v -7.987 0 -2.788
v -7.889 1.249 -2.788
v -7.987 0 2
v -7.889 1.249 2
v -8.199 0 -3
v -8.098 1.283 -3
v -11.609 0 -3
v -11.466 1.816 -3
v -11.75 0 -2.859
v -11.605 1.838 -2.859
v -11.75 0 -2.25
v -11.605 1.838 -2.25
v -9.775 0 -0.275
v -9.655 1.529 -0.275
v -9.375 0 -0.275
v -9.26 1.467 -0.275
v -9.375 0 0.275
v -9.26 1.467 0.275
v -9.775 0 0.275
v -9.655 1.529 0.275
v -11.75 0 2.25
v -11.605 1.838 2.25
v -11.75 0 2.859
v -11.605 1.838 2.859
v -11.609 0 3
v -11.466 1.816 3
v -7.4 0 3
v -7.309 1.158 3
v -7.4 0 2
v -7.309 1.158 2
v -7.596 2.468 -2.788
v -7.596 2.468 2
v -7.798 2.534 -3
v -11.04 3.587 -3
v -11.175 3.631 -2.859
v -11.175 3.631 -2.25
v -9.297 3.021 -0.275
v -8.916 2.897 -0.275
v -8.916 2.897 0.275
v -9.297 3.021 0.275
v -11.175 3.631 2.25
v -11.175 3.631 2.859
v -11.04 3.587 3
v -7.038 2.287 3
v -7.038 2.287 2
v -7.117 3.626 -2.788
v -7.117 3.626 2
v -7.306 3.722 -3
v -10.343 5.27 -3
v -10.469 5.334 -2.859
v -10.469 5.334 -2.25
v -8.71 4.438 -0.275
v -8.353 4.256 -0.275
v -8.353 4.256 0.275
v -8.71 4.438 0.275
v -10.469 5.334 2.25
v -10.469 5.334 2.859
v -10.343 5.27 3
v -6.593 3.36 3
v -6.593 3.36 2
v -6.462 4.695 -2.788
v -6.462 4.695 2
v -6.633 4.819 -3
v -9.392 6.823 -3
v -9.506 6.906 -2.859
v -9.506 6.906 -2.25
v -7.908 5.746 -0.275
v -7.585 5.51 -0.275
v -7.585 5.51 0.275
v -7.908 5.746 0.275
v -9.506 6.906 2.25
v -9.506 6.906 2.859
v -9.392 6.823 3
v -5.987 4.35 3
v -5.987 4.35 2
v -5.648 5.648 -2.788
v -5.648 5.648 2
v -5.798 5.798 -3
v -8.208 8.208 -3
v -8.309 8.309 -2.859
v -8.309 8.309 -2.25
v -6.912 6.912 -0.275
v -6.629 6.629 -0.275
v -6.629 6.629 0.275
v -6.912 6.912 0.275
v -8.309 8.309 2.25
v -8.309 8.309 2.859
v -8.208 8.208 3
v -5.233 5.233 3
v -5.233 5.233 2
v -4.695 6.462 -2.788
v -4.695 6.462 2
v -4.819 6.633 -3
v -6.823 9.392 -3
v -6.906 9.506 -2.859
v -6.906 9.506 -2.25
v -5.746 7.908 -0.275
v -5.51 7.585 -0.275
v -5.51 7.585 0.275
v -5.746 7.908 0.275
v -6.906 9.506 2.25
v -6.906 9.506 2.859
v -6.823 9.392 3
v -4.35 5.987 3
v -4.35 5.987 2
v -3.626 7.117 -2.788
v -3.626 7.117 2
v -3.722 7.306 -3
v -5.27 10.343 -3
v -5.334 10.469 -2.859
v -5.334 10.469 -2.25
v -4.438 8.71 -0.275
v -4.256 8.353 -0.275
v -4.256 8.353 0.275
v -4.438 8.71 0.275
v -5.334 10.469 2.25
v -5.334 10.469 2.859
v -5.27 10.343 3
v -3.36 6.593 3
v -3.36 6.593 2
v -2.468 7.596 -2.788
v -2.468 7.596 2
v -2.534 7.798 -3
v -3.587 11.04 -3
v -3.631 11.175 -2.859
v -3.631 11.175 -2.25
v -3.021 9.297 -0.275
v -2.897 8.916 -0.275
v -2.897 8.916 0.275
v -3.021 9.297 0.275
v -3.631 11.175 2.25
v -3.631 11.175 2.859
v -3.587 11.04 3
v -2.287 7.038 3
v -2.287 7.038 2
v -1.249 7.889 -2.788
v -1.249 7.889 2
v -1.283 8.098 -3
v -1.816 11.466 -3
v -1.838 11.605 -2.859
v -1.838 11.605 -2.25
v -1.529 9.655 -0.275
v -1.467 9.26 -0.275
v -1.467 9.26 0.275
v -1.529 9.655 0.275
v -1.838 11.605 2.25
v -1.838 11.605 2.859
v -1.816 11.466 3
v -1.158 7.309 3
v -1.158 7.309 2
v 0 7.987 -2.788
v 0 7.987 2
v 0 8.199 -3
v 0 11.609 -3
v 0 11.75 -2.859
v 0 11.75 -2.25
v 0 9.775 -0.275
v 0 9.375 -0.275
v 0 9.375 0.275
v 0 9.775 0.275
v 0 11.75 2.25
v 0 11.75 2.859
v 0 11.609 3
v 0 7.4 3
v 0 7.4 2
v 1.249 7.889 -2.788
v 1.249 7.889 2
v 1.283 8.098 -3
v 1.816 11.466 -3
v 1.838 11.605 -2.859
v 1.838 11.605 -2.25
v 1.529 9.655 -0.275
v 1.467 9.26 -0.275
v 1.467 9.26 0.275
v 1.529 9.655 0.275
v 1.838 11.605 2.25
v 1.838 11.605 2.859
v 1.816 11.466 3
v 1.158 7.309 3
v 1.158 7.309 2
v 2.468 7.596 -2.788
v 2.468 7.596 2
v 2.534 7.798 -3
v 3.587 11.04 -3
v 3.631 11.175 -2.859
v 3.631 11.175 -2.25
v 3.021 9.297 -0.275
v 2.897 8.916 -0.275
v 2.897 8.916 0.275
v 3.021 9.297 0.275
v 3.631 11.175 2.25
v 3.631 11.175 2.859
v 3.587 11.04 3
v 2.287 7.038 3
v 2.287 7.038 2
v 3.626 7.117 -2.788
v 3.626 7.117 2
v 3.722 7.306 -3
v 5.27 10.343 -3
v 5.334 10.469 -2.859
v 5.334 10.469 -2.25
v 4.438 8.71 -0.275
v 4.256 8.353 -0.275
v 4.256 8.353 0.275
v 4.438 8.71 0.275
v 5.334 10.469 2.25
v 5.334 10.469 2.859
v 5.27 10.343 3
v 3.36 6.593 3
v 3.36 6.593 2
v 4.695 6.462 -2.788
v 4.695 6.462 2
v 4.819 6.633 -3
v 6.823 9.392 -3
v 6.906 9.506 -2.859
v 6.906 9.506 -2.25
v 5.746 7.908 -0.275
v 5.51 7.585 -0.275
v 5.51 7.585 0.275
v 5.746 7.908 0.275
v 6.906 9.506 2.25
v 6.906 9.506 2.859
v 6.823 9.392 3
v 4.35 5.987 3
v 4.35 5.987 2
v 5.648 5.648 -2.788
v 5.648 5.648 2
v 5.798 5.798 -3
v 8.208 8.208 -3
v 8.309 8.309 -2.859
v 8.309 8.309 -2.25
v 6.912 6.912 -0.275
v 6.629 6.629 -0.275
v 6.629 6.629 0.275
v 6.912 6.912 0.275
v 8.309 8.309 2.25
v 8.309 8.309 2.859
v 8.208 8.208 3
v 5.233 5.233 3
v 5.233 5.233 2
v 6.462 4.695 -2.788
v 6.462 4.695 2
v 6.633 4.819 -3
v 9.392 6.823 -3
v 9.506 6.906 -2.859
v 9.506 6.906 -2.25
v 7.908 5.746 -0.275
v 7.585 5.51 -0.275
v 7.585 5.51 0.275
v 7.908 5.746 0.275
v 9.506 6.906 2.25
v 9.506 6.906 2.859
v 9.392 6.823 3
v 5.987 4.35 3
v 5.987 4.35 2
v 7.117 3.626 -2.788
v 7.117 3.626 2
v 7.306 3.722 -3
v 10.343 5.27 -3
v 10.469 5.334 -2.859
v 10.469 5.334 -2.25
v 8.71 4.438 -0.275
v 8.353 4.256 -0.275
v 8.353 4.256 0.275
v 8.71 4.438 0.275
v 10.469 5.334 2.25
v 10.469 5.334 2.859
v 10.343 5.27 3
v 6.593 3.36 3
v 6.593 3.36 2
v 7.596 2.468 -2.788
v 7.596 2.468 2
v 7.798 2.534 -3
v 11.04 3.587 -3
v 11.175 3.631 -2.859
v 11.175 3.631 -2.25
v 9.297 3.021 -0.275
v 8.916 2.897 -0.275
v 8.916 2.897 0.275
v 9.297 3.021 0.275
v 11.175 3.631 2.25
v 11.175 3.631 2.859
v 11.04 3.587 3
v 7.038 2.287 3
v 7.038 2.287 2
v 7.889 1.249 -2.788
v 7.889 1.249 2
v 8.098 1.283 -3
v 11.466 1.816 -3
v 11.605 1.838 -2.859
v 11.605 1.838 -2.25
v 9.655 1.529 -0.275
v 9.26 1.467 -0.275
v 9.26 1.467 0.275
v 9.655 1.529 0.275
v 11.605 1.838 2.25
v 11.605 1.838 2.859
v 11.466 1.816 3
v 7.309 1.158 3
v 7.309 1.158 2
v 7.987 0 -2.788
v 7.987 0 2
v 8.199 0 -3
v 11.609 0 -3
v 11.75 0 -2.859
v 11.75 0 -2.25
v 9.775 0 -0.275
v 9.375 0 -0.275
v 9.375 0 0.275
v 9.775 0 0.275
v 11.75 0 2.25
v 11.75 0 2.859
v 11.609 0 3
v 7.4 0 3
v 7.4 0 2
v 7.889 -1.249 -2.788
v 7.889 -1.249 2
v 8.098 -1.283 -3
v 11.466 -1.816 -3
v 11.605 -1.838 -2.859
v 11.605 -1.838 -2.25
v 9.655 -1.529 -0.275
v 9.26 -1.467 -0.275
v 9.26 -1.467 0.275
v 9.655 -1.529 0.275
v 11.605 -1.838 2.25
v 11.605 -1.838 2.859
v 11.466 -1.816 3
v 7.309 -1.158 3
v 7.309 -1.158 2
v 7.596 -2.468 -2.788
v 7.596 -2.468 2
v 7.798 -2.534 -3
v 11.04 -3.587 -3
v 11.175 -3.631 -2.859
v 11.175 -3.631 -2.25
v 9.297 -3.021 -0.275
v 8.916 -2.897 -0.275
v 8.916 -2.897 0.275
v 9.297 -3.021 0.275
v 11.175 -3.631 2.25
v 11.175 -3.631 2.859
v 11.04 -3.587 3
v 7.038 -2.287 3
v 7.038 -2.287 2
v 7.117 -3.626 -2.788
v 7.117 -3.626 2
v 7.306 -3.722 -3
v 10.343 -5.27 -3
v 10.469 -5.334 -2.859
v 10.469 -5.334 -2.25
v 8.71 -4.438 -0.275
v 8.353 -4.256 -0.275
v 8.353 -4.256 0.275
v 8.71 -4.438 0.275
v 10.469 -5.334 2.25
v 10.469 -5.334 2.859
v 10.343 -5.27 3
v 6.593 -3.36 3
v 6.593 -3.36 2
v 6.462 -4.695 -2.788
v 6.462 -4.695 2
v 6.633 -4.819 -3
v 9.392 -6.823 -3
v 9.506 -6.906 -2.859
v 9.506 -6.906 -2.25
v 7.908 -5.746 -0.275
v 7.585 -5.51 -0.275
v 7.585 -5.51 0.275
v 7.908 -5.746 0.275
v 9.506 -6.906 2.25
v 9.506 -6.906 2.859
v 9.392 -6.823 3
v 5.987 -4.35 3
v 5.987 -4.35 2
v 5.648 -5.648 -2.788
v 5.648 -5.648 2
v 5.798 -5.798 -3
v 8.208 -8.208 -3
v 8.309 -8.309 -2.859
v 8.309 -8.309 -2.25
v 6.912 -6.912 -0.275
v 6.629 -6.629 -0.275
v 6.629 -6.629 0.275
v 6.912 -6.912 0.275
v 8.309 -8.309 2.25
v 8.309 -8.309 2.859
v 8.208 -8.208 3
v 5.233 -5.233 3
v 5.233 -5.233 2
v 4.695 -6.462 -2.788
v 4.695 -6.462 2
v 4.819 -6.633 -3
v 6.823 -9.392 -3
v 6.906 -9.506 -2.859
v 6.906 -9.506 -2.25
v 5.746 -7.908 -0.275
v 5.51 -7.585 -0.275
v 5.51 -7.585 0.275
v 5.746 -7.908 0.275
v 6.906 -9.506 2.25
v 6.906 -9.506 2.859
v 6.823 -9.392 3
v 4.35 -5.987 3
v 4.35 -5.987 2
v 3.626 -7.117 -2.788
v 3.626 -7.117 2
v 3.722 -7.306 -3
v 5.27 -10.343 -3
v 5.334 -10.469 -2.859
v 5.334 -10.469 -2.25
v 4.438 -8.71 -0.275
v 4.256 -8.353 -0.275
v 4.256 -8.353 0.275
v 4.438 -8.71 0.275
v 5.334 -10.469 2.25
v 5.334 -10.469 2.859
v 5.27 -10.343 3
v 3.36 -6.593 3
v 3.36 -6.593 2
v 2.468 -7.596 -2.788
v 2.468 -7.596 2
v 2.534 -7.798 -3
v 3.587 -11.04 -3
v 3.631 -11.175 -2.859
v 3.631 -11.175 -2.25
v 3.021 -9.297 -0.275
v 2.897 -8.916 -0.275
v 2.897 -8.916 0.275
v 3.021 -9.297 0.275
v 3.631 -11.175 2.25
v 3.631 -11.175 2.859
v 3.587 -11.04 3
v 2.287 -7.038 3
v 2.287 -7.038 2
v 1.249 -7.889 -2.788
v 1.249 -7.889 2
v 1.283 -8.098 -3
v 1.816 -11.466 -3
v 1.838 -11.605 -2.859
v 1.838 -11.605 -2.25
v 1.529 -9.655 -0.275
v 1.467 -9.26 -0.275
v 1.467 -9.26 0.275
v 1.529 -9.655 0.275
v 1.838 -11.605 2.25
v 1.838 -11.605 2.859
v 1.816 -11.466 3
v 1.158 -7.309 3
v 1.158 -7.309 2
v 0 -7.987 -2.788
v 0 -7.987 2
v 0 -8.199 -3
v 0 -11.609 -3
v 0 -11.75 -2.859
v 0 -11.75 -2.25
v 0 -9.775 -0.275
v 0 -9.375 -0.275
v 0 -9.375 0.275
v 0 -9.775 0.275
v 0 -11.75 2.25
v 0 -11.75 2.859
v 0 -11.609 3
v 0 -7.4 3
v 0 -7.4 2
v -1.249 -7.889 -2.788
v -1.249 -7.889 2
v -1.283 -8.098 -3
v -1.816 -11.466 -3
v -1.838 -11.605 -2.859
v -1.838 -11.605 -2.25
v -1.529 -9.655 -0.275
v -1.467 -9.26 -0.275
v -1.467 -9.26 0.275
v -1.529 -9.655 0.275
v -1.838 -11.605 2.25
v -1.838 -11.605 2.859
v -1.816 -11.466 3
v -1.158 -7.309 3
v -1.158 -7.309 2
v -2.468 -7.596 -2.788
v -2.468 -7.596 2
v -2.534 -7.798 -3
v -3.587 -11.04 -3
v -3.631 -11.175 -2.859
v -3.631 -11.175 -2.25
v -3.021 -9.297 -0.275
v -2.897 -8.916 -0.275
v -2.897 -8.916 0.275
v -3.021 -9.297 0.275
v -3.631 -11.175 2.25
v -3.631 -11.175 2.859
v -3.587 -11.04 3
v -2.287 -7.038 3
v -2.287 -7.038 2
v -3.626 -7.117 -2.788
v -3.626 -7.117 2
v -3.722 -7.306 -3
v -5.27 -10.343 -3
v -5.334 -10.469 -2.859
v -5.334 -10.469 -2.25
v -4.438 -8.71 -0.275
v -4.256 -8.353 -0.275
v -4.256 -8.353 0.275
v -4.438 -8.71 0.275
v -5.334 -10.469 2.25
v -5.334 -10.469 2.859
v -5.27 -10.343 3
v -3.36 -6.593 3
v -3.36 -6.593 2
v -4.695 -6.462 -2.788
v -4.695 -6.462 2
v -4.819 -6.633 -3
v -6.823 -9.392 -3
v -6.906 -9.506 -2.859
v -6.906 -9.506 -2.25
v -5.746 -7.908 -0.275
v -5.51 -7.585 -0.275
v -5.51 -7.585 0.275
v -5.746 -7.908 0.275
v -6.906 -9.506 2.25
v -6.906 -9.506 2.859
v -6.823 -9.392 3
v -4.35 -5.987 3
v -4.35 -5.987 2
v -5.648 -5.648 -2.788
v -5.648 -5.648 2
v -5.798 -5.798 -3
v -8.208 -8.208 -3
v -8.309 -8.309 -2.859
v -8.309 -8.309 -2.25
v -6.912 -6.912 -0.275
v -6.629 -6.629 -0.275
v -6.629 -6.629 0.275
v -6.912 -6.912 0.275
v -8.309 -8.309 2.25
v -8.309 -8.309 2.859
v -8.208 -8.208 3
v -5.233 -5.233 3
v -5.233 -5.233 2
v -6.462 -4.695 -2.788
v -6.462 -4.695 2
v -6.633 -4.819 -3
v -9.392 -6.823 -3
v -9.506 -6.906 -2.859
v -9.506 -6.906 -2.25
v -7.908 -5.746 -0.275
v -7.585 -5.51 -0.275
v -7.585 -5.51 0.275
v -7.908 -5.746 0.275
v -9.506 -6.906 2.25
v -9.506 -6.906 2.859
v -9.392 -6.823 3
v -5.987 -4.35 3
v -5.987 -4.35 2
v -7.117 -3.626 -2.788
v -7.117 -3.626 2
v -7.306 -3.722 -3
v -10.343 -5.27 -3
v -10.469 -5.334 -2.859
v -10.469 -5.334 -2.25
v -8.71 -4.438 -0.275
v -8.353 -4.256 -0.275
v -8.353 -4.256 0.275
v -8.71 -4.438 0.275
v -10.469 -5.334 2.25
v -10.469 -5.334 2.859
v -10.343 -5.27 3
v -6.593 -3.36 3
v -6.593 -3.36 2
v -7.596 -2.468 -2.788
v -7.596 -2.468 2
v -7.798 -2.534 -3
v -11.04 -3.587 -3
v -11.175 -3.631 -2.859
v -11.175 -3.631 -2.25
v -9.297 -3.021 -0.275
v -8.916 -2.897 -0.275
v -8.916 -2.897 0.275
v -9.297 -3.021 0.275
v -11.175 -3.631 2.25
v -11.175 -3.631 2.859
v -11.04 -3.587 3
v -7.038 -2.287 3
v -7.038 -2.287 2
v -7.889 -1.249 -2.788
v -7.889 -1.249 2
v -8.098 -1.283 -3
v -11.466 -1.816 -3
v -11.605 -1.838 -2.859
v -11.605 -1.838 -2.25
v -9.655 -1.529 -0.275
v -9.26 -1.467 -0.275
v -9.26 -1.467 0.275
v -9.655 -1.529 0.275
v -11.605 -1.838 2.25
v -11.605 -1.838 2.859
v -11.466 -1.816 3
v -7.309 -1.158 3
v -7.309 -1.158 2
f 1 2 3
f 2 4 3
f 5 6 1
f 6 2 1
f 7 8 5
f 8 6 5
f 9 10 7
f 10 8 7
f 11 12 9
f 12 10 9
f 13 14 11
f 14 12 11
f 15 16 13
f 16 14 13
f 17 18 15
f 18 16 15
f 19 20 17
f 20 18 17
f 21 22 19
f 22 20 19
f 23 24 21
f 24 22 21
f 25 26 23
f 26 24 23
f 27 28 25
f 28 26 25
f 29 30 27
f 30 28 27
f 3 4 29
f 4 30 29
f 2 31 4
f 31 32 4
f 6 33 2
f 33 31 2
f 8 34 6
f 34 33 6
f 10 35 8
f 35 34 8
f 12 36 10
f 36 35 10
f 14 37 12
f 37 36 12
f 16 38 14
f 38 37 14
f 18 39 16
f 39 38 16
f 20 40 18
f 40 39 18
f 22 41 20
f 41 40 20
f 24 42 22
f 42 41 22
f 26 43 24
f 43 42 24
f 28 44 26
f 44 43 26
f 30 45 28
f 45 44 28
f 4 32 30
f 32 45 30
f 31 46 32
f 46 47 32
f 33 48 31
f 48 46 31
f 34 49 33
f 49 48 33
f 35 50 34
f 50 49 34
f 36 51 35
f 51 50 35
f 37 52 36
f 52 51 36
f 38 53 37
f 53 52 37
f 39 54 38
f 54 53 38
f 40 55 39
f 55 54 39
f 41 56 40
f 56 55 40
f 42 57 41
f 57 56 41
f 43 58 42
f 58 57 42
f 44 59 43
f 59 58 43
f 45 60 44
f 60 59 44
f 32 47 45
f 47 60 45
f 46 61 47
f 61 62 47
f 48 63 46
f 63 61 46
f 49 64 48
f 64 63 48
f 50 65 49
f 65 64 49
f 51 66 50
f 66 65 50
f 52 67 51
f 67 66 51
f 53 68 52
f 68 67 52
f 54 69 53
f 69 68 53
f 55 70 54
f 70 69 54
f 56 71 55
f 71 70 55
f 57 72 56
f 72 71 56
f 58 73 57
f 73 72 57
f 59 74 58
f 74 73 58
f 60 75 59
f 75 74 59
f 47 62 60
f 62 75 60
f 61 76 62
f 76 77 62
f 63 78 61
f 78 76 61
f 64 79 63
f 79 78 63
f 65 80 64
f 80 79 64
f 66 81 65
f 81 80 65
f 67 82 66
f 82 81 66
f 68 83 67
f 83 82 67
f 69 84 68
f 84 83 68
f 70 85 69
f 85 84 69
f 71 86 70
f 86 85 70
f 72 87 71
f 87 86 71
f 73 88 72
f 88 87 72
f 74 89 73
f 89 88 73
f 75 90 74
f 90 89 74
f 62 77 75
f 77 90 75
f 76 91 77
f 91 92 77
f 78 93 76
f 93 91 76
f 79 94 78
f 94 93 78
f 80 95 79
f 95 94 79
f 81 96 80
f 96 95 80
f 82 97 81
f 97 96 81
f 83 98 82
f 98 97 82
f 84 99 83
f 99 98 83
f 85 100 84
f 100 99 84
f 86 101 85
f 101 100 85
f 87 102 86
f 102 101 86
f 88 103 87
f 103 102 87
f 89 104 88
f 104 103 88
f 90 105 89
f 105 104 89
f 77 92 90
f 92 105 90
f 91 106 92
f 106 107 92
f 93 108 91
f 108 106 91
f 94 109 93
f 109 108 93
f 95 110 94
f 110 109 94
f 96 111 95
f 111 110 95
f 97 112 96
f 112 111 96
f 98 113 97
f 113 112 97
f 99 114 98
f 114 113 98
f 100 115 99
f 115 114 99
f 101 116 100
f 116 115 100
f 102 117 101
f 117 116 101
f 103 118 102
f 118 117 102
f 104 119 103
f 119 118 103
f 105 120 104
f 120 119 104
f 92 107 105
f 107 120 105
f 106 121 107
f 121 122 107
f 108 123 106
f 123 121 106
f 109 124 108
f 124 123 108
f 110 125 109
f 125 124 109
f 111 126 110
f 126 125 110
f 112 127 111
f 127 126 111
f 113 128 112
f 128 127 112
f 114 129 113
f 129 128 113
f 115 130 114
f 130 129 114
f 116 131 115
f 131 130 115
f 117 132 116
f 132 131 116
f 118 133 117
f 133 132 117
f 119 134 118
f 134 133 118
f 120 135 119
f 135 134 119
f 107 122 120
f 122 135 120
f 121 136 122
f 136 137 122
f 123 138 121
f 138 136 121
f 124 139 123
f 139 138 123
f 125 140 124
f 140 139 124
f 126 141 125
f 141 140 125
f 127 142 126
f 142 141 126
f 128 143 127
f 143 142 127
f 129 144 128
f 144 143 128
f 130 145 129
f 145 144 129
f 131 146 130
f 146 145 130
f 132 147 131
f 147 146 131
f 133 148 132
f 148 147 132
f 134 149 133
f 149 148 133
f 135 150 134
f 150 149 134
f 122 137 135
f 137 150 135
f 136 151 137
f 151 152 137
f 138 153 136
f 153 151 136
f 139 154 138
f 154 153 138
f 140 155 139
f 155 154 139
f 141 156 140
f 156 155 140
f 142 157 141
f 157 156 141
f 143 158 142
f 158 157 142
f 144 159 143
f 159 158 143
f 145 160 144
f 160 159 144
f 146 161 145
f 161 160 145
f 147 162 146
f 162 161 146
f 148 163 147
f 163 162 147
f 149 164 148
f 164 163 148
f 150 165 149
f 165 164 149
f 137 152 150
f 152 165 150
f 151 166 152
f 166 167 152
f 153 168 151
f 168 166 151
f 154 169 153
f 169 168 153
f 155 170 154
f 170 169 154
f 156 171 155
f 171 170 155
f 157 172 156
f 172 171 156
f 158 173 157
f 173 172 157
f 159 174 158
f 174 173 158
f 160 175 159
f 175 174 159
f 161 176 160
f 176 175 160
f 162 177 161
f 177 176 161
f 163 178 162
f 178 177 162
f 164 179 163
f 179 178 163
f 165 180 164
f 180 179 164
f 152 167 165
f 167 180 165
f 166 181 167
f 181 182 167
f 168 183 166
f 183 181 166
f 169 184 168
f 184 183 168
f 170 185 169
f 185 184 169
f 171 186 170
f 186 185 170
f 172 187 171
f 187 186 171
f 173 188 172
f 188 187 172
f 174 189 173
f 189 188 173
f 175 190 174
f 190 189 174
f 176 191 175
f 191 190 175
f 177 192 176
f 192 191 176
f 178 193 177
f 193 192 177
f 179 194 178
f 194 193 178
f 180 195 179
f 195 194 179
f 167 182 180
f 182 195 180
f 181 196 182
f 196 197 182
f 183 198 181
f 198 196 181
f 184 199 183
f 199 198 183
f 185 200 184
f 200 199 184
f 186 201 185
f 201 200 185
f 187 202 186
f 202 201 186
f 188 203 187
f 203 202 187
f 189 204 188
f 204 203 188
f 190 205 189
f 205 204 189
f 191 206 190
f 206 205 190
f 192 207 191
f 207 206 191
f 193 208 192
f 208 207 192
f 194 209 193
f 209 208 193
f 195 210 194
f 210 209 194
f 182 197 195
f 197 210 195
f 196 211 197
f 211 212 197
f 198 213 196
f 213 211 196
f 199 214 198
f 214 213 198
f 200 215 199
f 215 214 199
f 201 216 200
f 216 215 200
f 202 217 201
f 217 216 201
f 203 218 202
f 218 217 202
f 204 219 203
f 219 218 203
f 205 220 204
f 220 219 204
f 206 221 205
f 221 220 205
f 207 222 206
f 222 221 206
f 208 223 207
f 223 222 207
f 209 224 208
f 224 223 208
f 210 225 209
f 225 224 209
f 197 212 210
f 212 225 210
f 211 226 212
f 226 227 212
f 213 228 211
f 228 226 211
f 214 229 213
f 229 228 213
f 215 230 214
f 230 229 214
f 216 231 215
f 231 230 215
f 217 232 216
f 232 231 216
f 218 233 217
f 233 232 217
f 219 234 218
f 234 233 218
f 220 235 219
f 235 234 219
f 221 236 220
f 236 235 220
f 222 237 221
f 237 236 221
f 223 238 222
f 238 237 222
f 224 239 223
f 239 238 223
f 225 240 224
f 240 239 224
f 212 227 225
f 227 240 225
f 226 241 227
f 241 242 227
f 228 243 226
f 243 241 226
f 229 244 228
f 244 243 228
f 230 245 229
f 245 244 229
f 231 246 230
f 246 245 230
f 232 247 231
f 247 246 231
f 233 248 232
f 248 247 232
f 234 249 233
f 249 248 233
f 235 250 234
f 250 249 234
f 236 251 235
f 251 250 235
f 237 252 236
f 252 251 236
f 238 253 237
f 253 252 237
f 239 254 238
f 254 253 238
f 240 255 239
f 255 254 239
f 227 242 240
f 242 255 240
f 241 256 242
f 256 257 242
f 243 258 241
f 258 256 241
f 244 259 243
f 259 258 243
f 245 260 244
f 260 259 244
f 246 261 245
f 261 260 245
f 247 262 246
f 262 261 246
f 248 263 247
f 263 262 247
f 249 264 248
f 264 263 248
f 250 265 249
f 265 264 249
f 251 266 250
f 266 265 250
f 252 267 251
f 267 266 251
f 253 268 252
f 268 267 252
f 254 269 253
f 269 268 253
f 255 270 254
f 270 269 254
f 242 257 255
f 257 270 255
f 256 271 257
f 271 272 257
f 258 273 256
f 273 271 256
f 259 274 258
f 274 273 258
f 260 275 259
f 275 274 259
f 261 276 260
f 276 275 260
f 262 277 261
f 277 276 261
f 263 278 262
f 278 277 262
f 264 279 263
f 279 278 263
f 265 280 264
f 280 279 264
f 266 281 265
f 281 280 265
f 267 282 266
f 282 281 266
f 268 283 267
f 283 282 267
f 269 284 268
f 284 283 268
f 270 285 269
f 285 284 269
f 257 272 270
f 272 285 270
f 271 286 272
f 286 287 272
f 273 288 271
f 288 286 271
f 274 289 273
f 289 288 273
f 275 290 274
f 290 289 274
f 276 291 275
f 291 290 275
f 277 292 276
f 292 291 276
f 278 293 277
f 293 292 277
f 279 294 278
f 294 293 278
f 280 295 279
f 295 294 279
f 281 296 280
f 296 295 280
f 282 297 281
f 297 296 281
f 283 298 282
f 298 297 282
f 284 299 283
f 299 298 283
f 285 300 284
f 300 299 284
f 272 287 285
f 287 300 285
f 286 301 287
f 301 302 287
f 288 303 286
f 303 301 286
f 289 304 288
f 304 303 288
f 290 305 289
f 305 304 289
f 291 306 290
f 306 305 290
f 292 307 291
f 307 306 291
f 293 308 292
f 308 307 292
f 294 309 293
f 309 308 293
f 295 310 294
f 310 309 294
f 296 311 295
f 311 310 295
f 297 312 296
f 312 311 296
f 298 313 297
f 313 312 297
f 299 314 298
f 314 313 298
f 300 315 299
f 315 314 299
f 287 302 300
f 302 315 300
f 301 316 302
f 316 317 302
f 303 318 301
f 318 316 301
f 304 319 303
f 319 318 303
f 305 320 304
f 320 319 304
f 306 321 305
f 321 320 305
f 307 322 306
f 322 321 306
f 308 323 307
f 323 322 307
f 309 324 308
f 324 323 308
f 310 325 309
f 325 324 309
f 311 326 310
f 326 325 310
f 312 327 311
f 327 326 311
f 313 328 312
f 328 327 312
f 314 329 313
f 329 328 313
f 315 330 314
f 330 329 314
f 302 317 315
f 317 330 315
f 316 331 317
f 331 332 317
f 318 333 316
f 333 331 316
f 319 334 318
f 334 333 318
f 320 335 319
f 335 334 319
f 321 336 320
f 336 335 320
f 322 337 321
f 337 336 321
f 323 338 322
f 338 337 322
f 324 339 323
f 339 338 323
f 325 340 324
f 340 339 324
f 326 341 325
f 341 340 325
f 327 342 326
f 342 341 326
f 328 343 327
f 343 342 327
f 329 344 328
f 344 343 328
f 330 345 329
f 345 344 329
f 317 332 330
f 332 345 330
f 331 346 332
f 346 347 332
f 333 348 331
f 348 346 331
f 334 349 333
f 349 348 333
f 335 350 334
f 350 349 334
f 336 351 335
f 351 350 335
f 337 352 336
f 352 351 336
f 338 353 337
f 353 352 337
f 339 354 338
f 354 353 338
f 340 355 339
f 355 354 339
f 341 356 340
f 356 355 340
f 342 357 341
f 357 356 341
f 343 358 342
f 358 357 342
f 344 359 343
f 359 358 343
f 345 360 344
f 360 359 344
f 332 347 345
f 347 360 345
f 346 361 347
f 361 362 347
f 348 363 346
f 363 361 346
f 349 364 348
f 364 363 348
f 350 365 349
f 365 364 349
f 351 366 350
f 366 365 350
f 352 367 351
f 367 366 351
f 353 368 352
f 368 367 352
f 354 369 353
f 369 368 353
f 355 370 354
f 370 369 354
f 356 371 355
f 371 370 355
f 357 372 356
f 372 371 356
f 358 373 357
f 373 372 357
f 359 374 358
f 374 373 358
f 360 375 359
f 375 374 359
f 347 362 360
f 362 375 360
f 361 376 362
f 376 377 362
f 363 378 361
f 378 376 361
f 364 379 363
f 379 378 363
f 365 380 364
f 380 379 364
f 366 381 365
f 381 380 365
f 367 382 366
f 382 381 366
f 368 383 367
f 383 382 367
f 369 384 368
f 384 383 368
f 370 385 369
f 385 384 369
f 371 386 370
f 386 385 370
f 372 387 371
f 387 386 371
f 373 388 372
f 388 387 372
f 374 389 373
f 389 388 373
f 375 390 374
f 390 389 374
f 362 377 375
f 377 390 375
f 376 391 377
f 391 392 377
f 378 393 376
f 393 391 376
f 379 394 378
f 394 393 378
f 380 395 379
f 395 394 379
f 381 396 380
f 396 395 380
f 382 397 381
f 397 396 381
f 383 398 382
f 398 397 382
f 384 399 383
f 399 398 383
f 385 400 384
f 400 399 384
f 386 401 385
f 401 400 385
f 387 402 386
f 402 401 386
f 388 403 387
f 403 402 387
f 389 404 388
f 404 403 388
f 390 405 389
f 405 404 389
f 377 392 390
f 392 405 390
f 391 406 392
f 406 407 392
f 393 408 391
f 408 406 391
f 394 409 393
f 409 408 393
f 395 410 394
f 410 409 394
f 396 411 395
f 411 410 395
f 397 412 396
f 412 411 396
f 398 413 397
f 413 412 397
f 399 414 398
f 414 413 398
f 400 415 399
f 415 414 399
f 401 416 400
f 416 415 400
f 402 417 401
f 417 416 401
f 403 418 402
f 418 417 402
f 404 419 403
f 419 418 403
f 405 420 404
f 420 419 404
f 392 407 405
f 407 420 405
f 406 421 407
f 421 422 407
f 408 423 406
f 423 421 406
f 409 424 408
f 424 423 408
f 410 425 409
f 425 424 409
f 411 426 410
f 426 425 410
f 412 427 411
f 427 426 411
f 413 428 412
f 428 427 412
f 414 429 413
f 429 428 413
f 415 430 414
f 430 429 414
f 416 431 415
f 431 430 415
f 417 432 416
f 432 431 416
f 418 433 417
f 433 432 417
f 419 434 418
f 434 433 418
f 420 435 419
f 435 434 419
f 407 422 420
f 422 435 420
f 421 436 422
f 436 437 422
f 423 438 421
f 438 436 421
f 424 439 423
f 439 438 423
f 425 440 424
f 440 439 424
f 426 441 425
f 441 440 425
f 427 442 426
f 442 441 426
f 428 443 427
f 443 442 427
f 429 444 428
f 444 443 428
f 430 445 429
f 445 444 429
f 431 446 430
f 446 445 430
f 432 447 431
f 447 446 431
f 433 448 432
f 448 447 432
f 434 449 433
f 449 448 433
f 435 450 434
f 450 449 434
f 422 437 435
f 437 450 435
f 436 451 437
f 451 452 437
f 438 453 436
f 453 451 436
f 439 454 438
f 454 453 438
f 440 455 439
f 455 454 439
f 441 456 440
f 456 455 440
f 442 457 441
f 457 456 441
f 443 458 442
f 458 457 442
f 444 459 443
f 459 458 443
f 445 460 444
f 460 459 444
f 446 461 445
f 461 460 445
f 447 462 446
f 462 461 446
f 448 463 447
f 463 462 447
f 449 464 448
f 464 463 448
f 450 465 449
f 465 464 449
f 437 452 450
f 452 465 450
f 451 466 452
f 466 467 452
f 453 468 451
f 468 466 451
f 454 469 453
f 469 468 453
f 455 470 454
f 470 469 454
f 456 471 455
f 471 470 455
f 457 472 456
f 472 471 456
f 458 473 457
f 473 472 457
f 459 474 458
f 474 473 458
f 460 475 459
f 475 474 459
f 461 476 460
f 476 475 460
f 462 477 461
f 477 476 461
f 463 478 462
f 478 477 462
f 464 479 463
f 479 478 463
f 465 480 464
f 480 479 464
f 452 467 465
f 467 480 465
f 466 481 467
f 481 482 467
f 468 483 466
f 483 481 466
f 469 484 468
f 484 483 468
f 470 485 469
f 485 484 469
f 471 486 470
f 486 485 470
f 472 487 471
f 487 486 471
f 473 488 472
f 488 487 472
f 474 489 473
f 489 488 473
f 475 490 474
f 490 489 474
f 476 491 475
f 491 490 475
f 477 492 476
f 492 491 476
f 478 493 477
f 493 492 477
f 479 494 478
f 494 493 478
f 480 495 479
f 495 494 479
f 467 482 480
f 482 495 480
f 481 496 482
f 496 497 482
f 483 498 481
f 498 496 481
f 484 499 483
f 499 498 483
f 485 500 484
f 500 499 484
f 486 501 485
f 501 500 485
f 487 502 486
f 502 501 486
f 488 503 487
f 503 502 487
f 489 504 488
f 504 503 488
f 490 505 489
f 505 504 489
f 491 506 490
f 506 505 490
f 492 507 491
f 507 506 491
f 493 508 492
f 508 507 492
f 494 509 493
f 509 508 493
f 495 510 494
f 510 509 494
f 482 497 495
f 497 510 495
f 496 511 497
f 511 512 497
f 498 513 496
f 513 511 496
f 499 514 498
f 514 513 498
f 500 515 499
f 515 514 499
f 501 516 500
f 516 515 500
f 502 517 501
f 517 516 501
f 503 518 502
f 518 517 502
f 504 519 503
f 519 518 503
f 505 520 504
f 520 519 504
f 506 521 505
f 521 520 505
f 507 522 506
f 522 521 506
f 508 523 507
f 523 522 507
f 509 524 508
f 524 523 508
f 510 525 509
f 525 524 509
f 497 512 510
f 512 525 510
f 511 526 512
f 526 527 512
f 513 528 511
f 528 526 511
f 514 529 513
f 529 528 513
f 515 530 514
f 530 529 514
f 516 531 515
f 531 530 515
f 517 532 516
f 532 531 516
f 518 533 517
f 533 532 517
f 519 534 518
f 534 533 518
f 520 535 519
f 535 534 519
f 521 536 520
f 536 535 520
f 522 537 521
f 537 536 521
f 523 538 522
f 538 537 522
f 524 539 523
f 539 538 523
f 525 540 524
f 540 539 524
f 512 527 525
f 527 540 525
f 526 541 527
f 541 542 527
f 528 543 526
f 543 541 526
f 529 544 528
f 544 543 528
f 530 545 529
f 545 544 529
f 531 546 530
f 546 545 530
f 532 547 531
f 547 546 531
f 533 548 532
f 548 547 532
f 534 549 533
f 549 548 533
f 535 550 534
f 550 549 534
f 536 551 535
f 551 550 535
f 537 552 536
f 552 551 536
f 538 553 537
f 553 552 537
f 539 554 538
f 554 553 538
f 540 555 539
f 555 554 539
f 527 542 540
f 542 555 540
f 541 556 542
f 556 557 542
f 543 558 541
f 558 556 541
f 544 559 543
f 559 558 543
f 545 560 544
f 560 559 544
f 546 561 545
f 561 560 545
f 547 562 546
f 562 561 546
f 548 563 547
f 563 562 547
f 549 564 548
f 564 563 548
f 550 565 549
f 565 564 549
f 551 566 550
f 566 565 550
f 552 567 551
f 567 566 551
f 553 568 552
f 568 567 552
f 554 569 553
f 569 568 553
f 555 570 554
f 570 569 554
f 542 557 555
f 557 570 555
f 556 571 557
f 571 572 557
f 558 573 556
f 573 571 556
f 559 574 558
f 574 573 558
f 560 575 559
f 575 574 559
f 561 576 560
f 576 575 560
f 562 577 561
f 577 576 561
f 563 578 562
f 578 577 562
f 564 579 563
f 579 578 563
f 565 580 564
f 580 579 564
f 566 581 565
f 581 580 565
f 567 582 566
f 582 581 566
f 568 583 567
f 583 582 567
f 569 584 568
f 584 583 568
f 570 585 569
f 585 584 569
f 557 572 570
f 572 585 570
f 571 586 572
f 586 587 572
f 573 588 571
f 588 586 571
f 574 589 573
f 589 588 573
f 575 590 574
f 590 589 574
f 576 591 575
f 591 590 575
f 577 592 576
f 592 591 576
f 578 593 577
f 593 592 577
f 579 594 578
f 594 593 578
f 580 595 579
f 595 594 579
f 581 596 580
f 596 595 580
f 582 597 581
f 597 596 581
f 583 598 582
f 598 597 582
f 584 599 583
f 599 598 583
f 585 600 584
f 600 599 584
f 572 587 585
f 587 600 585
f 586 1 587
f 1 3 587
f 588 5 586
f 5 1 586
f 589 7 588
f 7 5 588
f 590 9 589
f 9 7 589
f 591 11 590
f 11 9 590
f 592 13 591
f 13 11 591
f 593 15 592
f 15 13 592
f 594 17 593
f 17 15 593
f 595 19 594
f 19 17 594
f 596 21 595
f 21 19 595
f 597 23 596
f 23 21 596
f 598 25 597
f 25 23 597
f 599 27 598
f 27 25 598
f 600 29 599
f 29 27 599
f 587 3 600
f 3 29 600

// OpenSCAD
// MakerSlide Component 
// http://www.makerslide.com
// b17001_rev_2
// Single Bearing Delrin V Wheel
// Original by Barton Dring
// OpenSCAD model by Mike Sheldrake

vwheel(false);

module vwheelbearing() { //id=5mm,od=16mm,width=5mm
	color([0.5,0.5,0.5])
	difference() {
		cylinder(r=8,h=5,$fn=24);
		translate([0,0,-0.05]) cylinder(r=2.5,h=5.1,$fn=12);
		}
	}

module vwheel(withbearing=true) { //MakerSlide.com delrin v wheel
id1=15.9743;
id2=14.8;
od1=23.5;
od2=18.75;
color([0.2,0.2,0.2])
rotate_extrude(convexity = 10,$fn=40)
translate([id1/2, 0, 0])
rotate([0,0,-90])
polygon(points = [
	[3 - 0.3/sqrt(2),0],
	[-2,0],
	[-2,-(id1-id2)/2],
	[-3,-(id1-id2)/2],
	[-3,(od1-id1)/2 - 0.2/sqrt(2)],
	[-3 + 0.2/sqrt(2),(od1-id1)/2],
	[-3 + 0.75,(od1-id1)/2],
	[-0.55/2,   (od1-id1)/2 - (3 - (0.75+(0.55/2)))],
	[-0.55/2,(od2-id1)/2],
	[0.55/2,(od2-id1)/2],
	[0.55/2,   (od1-id1)/2 - (3 - (0.75+(0.55/2)))],
	[3 - 0.75,(od1-id1)/2],
	[3 - 0.2/sqrt(2),(od1-id1)/2],
	[3,(od1-id1)/2 - 0.2/sqrt(2)],
	[3,0.3/sqrt(2)]
	],
	paths = [
	 [0,1,2,3,4,5,6,7,8,9,10,11,12,13,14]
	 ], convexity = 10);

	if (withbearing) {translate([0,0,-3]) vwheelbearing();}

	}
